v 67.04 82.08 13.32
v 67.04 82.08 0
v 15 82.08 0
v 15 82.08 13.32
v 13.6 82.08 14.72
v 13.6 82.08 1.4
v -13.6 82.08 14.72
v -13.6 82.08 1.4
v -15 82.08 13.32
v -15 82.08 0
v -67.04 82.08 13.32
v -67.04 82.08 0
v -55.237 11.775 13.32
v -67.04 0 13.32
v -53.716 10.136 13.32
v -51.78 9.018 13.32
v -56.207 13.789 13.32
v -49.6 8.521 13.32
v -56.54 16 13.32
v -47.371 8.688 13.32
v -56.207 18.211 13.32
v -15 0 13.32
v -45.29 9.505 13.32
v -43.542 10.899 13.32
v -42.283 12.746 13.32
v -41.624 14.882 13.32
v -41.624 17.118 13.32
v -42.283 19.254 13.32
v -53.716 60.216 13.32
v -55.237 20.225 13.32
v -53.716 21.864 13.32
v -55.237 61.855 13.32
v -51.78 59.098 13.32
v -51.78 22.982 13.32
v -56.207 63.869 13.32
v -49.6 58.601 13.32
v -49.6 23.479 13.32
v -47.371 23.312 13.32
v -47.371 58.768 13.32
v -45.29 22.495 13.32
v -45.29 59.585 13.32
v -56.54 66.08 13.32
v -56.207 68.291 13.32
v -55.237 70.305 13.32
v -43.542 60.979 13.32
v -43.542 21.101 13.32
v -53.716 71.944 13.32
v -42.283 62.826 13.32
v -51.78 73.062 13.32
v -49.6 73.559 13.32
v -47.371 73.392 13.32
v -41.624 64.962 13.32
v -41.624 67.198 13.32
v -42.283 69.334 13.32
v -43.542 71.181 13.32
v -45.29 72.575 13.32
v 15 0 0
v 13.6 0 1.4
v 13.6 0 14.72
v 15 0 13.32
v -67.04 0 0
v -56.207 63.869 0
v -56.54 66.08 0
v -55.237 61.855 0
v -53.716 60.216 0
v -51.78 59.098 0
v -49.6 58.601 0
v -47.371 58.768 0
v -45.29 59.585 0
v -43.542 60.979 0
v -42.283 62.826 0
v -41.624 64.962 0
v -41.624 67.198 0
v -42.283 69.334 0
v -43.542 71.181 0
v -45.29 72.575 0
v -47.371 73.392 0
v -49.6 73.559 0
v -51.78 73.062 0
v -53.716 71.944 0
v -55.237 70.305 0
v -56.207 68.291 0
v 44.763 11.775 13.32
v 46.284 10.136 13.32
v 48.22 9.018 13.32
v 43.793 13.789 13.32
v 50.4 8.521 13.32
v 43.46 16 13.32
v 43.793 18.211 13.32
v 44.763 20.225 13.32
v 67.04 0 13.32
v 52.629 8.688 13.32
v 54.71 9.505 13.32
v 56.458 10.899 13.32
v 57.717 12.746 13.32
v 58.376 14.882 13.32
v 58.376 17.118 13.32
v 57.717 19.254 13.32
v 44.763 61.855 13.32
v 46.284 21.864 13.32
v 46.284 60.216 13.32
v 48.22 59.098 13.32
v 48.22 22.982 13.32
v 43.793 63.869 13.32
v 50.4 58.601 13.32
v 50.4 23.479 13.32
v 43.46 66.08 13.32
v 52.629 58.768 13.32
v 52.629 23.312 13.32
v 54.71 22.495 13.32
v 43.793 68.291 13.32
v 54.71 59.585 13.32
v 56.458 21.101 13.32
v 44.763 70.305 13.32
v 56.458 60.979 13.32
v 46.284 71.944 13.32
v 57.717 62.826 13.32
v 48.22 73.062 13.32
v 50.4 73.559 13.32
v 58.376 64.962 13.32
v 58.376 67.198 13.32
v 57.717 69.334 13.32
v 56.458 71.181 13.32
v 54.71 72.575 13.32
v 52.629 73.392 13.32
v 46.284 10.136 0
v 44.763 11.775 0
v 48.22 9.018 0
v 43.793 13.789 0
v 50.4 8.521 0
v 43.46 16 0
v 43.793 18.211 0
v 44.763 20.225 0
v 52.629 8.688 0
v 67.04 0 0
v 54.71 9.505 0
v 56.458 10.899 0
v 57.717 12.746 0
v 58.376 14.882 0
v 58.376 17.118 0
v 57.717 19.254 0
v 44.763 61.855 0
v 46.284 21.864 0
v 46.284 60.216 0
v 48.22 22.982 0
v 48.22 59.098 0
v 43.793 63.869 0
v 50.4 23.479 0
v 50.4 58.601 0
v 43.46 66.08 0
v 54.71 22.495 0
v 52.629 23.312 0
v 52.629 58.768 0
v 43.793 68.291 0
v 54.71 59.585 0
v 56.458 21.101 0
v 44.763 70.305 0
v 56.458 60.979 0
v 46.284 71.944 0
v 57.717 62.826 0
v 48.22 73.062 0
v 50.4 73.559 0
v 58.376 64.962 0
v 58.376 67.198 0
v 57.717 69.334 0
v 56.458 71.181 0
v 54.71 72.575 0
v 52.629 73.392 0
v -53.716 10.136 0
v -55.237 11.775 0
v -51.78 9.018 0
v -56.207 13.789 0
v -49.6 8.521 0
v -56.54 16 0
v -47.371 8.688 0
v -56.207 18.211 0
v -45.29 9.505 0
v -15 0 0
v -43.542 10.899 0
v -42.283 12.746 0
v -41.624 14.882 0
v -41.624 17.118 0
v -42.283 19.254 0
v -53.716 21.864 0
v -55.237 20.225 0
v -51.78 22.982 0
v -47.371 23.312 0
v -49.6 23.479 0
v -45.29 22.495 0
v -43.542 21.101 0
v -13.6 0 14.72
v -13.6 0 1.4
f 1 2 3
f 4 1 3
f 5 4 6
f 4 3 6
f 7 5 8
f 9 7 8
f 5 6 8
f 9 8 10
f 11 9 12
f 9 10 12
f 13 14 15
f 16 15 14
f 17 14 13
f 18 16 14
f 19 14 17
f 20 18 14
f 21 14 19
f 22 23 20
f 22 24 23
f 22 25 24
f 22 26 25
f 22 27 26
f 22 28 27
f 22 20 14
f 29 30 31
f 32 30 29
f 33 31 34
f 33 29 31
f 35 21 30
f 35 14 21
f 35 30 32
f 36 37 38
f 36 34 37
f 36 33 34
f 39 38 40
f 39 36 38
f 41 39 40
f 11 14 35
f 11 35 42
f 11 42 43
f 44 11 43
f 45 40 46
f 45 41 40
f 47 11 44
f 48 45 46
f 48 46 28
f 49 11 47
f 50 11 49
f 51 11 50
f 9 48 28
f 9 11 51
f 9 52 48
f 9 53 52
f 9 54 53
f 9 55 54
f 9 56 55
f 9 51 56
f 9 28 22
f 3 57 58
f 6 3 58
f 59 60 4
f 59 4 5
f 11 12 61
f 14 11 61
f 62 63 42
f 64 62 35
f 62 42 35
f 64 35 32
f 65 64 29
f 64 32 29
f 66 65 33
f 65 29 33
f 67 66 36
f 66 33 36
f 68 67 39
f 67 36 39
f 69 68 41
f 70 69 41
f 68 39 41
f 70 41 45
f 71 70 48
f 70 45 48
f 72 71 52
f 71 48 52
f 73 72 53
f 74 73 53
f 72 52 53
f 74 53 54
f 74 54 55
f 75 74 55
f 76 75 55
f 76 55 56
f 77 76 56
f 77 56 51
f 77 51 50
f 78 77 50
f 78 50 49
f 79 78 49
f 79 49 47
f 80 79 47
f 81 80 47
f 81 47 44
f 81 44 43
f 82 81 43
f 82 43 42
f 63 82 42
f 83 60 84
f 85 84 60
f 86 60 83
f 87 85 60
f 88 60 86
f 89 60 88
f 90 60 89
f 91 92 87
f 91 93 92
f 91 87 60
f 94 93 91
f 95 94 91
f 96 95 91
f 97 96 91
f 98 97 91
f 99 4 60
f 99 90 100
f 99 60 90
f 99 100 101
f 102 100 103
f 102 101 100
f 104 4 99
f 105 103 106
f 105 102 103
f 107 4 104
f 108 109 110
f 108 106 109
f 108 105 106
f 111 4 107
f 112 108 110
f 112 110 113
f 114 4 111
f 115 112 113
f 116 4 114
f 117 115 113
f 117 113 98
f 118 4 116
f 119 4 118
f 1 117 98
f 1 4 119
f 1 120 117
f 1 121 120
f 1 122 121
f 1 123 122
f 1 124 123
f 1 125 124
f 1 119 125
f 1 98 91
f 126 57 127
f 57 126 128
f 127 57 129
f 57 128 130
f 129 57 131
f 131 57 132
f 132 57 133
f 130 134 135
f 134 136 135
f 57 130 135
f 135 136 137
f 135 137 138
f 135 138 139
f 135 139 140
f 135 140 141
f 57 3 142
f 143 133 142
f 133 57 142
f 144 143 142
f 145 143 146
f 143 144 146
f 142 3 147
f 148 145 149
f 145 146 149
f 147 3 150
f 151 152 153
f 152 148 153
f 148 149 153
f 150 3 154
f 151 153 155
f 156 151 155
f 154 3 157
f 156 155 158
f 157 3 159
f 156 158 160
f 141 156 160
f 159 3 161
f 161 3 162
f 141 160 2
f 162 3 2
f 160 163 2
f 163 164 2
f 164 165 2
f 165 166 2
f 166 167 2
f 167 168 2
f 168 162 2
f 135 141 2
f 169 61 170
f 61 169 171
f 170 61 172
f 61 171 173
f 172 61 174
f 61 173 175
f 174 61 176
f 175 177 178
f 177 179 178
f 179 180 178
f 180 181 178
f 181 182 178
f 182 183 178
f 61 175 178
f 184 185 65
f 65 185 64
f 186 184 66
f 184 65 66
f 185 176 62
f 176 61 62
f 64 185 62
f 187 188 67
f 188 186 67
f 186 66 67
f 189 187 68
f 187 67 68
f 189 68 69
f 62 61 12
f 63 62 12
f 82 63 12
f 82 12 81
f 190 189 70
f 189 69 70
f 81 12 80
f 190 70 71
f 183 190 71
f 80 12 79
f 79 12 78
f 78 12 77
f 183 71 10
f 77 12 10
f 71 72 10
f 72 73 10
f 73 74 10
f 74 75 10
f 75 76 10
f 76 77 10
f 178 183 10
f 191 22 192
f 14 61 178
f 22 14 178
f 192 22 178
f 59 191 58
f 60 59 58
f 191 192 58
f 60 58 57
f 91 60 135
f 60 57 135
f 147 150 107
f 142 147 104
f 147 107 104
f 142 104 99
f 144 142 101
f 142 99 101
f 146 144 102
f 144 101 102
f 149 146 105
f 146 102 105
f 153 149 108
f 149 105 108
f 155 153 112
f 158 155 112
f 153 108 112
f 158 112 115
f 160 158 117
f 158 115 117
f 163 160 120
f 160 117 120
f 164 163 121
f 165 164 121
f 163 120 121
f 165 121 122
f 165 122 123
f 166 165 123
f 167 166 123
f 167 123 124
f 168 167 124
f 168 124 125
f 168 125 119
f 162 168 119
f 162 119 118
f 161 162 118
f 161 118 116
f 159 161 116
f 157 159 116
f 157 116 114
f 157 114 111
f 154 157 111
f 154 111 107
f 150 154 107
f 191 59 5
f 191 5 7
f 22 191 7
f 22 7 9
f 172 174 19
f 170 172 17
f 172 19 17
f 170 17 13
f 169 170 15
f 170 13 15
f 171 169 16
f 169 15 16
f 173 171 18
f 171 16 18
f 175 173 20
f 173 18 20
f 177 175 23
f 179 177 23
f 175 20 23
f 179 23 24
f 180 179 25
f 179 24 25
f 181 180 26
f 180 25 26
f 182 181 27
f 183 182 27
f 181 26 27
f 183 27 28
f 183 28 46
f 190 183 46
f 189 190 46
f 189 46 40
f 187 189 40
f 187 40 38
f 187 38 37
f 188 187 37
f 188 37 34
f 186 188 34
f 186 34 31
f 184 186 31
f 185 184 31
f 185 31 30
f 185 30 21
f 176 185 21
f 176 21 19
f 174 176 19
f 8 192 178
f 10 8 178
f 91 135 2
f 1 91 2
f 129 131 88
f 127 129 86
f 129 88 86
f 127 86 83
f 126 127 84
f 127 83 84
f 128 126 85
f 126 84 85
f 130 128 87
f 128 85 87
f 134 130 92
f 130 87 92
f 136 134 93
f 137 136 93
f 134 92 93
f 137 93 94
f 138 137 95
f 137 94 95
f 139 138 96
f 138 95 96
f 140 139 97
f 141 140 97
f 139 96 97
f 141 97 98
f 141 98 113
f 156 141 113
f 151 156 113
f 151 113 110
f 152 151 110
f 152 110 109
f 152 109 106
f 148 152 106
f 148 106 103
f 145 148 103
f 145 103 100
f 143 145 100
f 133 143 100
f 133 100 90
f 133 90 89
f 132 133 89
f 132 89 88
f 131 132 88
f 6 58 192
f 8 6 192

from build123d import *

# Parameters (mm, degrees)
F1_DEPTH = 13.32
F4_DEPTH = 82.081
F7_DEPTH = 82.08
F9_D     = 15


with BuildPart() as f1:
    # F0 (on Top) → F1 (new body)
    with BuildSketch(Plane.XY):
        Polygon((-67.04, 0), (0, 0), (67.04, 0), (67.04, 82.08), (-67.04, 82.08), align=None)
    extrude(amount=F1_DEPTH)

    # F3 (on offset) → F4 (cut, through all)
    with BuildSketch(Plane.XZ):
        Polygon((-15, 0), (0, 0), (15, 0), (13.6, 1.4), (-13.6, 1.4), align=None)
    extrude(amount=-F4_DEPTH, mode=Mode.SUBTRACT)

    # F6 (on offset) → F7 (join)
    with BuildSketch(Plane.XZ):
        Polygon((-15, 13.32), (0, 13.32), (15, 13.32), (13.6, 14.72), (-13.6, 14.72), align=None)
    extrude(amount=-F7_DEPTH)

    # F9 (through all)
    with Locations(Plane(origin=(0, 0, 0), x_dir=(1, 0, 0), z_dir=(0, 0, -1))):
        with Locations((-49.04, -66.08), (-49.04, -16), (50.96, -16), (50.96, -66.08)):
            Hole(F9_D / 2)


solid = f1.part
